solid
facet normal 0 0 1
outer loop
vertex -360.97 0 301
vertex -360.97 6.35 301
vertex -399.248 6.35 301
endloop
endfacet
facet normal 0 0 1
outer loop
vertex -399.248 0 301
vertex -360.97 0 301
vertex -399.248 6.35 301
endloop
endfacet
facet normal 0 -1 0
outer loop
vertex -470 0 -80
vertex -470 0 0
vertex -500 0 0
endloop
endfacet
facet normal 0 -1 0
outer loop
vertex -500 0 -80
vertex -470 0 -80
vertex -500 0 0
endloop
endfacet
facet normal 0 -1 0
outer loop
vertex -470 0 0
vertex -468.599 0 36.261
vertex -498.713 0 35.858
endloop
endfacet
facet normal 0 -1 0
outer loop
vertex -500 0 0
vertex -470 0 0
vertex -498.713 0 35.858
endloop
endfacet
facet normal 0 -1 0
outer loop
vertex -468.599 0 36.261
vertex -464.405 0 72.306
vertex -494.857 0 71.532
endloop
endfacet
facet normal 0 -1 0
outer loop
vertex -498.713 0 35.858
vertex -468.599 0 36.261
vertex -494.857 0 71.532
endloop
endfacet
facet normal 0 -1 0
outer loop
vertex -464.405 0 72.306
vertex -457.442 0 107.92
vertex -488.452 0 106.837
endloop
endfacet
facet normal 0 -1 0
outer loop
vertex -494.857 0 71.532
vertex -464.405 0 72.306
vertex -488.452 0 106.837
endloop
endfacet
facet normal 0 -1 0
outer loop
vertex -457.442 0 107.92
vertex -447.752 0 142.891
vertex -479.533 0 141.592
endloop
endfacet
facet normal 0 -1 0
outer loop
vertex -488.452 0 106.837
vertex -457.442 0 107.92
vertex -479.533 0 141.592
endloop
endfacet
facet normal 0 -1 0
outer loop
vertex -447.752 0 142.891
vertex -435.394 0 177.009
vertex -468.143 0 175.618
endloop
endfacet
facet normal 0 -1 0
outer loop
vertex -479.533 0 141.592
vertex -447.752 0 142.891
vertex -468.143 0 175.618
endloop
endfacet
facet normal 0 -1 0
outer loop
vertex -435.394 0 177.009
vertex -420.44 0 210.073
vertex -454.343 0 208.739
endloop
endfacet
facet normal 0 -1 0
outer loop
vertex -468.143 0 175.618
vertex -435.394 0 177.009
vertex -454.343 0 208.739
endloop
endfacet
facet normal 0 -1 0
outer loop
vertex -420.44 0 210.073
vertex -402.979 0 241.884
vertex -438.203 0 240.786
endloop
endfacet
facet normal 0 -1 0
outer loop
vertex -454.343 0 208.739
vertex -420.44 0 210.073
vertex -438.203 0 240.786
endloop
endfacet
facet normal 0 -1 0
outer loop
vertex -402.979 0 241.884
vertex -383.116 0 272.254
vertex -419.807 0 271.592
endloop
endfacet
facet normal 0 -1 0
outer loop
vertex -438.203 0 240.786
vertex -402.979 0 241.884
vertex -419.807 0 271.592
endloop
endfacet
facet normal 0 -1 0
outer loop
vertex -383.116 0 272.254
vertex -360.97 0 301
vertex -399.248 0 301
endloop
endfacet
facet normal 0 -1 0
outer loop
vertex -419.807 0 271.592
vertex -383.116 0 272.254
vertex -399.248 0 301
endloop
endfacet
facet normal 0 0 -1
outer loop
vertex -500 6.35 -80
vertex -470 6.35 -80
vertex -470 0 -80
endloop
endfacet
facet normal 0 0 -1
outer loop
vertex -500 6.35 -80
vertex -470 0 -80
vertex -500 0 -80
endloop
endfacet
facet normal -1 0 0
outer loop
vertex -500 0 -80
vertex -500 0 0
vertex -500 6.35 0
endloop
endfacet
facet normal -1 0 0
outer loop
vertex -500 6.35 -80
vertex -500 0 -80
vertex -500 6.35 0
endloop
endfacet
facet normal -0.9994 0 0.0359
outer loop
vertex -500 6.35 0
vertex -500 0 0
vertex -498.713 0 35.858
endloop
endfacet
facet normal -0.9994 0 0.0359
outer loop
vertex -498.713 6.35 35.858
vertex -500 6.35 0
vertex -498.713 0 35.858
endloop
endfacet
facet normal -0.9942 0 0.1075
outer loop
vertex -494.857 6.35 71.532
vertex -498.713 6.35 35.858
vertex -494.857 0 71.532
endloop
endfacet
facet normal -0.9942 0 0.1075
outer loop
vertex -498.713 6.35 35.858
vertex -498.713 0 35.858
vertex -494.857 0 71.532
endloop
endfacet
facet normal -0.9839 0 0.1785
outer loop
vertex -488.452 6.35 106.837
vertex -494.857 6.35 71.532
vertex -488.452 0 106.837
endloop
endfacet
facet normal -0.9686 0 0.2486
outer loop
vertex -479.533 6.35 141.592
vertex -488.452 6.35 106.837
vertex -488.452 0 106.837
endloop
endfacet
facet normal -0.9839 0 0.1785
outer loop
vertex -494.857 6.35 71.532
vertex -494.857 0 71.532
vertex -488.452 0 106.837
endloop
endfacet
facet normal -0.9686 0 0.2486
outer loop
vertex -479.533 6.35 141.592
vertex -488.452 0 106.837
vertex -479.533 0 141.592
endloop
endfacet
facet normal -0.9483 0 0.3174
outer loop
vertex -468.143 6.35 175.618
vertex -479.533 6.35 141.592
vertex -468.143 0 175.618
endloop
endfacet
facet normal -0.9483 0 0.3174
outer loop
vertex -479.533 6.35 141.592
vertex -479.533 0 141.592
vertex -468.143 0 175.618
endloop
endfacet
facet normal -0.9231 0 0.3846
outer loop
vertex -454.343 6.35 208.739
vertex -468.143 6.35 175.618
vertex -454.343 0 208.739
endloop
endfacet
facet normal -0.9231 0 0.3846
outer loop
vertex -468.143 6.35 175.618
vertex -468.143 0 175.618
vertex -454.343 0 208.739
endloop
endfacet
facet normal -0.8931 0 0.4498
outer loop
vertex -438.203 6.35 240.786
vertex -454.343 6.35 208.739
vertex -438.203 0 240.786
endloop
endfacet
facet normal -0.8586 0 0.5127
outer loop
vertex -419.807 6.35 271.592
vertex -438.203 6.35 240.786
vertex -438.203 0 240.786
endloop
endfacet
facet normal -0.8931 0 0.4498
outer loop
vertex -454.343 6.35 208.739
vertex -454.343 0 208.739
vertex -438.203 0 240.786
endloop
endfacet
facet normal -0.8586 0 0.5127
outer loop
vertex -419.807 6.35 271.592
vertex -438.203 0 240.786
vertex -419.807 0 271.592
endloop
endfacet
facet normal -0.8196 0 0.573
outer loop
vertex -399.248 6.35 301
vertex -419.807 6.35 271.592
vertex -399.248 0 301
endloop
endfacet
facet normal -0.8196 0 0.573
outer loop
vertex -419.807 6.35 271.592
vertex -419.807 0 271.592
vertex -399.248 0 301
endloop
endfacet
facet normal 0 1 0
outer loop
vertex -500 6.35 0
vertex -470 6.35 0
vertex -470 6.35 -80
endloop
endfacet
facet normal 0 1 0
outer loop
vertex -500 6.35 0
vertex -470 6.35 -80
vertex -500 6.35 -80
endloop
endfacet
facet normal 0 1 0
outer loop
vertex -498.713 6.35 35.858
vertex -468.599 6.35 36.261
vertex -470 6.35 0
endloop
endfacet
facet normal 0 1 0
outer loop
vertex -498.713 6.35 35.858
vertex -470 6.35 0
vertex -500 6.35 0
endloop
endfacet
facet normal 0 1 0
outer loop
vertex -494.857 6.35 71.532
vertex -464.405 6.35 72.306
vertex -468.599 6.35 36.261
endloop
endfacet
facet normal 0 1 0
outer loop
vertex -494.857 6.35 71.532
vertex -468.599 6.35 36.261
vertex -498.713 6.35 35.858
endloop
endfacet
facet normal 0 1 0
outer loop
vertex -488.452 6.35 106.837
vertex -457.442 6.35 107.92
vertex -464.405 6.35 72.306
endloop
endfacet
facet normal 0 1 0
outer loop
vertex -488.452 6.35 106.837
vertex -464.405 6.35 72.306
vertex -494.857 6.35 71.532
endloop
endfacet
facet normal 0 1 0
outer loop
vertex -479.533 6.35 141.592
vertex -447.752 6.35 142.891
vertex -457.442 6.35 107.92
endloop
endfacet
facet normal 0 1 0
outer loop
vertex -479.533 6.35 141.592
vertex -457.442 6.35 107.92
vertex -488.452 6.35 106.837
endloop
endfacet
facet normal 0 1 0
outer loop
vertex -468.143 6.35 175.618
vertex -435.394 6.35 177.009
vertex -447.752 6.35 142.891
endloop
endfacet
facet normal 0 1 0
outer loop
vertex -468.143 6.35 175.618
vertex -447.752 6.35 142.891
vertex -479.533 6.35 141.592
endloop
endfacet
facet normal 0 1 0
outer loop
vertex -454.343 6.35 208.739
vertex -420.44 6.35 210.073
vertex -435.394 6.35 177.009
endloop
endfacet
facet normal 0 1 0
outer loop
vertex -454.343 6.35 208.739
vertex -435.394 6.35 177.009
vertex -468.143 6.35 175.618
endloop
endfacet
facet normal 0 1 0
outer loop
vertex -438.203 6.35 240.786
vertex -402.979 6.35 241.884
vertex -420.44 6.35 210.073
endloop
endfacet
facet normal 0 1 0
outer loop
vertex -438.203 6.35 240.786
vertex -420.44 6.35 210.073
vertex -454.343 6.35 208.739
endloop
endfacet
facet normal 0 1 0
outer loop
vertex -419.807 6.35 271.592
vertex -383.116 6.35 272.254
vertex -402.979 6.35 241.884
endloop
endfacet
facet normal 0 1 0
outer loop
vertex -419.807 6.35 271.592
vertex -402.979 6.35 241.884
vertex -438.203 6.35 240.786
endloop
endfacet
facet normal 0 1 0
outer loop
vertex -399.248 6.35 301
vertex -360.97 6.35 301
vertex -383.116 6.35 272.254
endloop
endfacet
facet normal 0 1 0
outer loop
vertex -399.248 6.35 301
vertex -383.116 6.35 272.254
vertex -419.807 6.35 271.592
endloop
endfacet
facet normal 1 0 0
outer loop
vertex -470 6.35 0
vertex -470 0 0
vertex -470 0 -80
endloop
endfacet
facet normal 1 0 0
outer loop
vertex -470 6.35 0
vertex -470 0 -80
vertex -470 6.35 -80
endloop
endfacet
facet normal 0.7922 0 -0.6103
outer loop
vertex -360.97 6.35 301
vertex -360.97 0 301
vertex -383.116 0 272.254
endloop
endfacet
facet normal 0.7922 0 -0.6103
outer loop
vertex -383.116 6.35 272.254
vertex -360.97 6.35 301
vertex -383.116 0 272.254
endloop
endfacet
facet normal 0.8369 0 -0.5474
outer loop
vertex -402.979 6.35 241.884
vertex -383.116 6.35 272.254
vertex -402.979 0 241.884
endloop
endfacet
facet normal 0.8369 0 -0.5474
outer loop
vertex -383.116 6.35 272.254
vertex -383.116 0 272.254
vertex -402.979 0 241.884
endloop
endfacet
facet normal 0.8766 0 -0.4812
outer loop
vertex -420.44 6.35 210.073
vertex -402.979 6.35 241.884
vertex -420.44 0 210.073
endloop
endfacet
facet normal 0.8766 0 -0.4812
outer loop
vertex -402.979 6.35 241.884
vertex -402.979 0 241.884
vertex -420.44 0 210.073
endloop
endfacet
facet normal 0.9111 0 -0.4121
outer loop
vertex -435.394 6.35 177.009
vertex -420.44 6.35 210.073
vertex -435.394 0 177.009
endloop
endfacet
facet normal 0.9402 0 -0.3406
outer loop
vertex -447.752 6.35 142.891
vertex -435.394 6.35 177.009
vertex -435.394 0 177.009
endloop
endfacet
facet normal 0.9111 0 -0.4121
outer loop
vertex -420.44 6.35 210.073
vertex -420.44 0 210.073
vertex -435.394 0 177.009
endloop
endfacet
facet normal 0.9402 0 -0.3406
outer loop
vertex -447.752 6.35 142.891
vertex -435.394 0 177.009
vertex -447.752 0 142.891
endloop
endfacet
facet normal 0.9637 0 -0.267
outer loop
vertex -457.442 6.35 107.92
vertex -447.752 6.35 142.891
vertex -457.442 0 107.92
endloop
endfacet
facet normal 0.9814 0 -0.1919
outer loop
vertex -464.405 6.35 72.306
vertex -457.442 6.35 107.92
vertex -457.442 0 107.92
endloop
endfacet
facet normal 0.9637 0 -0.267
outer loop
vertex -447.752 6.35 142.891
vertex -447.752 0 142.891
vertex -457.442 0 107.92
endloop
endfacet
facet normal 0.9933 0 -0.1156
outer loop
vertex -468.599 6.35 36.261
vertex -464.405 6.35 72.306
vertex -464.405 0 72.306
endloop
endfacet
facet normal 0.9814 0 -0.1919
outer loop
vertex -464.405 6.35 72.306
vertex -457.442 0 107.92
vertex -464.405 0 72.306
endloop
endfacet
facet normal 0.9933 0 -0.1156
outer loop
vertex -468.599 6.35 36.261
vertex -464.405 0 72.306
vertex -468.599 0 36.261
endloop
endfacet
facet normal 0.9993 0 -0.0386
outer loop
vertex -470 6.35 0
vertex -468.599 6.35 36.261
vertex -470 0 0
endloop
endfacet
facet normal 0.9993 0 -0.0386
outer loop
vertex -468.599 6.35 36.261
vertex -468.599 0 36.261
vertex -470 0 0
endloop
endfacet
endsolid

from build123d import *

# Parameters (mm, degrees)
BOSS_EXTRUDE1_DEPTH = 6.35
SKETCH3_W           = 30
SKETCH3_H           = 6.35
BOSS_EXTRUDE2_DEPTH = 80


with BuildPart() as part:
    # Sketch2 → Boss-Extrude1 (new body)
    with BuildSketch(Plane(origin=(0, 0, 0), x_dir=(1, 0, 0), z_dir=(0, 1, 0))):
        with BuildLine():
            ThreePointArc((0, -470), (-332.340187158, -332.340187158), (-470, 0))
            Line((-470, 0), (-500, 0))
            ThreePointArc((-500, 0), (-353.553390593, -353.553390593), (0, -500))
            Line((0, -500), (0, -470))
        make_face()
    extrude(amount=BOSS_EXTRUDE1_DEPTH)

    # Sketch3 → Boss-Extrude2 (add)
    with BuildSketch(Plane(origin=(0, 0, 0), x_dir=(-1, 0, 0), z_dir=(0, 0, -1))):
        with Locations((485, 3.175)):
            Rectangle(SKETCH3_W, SKETCH3_H)
    extrude(amount=BOSS_EXTRUDE2_DEPTH)

    # Split1
    split(bisect_by=Plane(origin=(0, 0, 301), x_dir=(-1, 0, 0), z_dir=(0, 0, -1)), keep=Keep.TOP)


solid = part.part
